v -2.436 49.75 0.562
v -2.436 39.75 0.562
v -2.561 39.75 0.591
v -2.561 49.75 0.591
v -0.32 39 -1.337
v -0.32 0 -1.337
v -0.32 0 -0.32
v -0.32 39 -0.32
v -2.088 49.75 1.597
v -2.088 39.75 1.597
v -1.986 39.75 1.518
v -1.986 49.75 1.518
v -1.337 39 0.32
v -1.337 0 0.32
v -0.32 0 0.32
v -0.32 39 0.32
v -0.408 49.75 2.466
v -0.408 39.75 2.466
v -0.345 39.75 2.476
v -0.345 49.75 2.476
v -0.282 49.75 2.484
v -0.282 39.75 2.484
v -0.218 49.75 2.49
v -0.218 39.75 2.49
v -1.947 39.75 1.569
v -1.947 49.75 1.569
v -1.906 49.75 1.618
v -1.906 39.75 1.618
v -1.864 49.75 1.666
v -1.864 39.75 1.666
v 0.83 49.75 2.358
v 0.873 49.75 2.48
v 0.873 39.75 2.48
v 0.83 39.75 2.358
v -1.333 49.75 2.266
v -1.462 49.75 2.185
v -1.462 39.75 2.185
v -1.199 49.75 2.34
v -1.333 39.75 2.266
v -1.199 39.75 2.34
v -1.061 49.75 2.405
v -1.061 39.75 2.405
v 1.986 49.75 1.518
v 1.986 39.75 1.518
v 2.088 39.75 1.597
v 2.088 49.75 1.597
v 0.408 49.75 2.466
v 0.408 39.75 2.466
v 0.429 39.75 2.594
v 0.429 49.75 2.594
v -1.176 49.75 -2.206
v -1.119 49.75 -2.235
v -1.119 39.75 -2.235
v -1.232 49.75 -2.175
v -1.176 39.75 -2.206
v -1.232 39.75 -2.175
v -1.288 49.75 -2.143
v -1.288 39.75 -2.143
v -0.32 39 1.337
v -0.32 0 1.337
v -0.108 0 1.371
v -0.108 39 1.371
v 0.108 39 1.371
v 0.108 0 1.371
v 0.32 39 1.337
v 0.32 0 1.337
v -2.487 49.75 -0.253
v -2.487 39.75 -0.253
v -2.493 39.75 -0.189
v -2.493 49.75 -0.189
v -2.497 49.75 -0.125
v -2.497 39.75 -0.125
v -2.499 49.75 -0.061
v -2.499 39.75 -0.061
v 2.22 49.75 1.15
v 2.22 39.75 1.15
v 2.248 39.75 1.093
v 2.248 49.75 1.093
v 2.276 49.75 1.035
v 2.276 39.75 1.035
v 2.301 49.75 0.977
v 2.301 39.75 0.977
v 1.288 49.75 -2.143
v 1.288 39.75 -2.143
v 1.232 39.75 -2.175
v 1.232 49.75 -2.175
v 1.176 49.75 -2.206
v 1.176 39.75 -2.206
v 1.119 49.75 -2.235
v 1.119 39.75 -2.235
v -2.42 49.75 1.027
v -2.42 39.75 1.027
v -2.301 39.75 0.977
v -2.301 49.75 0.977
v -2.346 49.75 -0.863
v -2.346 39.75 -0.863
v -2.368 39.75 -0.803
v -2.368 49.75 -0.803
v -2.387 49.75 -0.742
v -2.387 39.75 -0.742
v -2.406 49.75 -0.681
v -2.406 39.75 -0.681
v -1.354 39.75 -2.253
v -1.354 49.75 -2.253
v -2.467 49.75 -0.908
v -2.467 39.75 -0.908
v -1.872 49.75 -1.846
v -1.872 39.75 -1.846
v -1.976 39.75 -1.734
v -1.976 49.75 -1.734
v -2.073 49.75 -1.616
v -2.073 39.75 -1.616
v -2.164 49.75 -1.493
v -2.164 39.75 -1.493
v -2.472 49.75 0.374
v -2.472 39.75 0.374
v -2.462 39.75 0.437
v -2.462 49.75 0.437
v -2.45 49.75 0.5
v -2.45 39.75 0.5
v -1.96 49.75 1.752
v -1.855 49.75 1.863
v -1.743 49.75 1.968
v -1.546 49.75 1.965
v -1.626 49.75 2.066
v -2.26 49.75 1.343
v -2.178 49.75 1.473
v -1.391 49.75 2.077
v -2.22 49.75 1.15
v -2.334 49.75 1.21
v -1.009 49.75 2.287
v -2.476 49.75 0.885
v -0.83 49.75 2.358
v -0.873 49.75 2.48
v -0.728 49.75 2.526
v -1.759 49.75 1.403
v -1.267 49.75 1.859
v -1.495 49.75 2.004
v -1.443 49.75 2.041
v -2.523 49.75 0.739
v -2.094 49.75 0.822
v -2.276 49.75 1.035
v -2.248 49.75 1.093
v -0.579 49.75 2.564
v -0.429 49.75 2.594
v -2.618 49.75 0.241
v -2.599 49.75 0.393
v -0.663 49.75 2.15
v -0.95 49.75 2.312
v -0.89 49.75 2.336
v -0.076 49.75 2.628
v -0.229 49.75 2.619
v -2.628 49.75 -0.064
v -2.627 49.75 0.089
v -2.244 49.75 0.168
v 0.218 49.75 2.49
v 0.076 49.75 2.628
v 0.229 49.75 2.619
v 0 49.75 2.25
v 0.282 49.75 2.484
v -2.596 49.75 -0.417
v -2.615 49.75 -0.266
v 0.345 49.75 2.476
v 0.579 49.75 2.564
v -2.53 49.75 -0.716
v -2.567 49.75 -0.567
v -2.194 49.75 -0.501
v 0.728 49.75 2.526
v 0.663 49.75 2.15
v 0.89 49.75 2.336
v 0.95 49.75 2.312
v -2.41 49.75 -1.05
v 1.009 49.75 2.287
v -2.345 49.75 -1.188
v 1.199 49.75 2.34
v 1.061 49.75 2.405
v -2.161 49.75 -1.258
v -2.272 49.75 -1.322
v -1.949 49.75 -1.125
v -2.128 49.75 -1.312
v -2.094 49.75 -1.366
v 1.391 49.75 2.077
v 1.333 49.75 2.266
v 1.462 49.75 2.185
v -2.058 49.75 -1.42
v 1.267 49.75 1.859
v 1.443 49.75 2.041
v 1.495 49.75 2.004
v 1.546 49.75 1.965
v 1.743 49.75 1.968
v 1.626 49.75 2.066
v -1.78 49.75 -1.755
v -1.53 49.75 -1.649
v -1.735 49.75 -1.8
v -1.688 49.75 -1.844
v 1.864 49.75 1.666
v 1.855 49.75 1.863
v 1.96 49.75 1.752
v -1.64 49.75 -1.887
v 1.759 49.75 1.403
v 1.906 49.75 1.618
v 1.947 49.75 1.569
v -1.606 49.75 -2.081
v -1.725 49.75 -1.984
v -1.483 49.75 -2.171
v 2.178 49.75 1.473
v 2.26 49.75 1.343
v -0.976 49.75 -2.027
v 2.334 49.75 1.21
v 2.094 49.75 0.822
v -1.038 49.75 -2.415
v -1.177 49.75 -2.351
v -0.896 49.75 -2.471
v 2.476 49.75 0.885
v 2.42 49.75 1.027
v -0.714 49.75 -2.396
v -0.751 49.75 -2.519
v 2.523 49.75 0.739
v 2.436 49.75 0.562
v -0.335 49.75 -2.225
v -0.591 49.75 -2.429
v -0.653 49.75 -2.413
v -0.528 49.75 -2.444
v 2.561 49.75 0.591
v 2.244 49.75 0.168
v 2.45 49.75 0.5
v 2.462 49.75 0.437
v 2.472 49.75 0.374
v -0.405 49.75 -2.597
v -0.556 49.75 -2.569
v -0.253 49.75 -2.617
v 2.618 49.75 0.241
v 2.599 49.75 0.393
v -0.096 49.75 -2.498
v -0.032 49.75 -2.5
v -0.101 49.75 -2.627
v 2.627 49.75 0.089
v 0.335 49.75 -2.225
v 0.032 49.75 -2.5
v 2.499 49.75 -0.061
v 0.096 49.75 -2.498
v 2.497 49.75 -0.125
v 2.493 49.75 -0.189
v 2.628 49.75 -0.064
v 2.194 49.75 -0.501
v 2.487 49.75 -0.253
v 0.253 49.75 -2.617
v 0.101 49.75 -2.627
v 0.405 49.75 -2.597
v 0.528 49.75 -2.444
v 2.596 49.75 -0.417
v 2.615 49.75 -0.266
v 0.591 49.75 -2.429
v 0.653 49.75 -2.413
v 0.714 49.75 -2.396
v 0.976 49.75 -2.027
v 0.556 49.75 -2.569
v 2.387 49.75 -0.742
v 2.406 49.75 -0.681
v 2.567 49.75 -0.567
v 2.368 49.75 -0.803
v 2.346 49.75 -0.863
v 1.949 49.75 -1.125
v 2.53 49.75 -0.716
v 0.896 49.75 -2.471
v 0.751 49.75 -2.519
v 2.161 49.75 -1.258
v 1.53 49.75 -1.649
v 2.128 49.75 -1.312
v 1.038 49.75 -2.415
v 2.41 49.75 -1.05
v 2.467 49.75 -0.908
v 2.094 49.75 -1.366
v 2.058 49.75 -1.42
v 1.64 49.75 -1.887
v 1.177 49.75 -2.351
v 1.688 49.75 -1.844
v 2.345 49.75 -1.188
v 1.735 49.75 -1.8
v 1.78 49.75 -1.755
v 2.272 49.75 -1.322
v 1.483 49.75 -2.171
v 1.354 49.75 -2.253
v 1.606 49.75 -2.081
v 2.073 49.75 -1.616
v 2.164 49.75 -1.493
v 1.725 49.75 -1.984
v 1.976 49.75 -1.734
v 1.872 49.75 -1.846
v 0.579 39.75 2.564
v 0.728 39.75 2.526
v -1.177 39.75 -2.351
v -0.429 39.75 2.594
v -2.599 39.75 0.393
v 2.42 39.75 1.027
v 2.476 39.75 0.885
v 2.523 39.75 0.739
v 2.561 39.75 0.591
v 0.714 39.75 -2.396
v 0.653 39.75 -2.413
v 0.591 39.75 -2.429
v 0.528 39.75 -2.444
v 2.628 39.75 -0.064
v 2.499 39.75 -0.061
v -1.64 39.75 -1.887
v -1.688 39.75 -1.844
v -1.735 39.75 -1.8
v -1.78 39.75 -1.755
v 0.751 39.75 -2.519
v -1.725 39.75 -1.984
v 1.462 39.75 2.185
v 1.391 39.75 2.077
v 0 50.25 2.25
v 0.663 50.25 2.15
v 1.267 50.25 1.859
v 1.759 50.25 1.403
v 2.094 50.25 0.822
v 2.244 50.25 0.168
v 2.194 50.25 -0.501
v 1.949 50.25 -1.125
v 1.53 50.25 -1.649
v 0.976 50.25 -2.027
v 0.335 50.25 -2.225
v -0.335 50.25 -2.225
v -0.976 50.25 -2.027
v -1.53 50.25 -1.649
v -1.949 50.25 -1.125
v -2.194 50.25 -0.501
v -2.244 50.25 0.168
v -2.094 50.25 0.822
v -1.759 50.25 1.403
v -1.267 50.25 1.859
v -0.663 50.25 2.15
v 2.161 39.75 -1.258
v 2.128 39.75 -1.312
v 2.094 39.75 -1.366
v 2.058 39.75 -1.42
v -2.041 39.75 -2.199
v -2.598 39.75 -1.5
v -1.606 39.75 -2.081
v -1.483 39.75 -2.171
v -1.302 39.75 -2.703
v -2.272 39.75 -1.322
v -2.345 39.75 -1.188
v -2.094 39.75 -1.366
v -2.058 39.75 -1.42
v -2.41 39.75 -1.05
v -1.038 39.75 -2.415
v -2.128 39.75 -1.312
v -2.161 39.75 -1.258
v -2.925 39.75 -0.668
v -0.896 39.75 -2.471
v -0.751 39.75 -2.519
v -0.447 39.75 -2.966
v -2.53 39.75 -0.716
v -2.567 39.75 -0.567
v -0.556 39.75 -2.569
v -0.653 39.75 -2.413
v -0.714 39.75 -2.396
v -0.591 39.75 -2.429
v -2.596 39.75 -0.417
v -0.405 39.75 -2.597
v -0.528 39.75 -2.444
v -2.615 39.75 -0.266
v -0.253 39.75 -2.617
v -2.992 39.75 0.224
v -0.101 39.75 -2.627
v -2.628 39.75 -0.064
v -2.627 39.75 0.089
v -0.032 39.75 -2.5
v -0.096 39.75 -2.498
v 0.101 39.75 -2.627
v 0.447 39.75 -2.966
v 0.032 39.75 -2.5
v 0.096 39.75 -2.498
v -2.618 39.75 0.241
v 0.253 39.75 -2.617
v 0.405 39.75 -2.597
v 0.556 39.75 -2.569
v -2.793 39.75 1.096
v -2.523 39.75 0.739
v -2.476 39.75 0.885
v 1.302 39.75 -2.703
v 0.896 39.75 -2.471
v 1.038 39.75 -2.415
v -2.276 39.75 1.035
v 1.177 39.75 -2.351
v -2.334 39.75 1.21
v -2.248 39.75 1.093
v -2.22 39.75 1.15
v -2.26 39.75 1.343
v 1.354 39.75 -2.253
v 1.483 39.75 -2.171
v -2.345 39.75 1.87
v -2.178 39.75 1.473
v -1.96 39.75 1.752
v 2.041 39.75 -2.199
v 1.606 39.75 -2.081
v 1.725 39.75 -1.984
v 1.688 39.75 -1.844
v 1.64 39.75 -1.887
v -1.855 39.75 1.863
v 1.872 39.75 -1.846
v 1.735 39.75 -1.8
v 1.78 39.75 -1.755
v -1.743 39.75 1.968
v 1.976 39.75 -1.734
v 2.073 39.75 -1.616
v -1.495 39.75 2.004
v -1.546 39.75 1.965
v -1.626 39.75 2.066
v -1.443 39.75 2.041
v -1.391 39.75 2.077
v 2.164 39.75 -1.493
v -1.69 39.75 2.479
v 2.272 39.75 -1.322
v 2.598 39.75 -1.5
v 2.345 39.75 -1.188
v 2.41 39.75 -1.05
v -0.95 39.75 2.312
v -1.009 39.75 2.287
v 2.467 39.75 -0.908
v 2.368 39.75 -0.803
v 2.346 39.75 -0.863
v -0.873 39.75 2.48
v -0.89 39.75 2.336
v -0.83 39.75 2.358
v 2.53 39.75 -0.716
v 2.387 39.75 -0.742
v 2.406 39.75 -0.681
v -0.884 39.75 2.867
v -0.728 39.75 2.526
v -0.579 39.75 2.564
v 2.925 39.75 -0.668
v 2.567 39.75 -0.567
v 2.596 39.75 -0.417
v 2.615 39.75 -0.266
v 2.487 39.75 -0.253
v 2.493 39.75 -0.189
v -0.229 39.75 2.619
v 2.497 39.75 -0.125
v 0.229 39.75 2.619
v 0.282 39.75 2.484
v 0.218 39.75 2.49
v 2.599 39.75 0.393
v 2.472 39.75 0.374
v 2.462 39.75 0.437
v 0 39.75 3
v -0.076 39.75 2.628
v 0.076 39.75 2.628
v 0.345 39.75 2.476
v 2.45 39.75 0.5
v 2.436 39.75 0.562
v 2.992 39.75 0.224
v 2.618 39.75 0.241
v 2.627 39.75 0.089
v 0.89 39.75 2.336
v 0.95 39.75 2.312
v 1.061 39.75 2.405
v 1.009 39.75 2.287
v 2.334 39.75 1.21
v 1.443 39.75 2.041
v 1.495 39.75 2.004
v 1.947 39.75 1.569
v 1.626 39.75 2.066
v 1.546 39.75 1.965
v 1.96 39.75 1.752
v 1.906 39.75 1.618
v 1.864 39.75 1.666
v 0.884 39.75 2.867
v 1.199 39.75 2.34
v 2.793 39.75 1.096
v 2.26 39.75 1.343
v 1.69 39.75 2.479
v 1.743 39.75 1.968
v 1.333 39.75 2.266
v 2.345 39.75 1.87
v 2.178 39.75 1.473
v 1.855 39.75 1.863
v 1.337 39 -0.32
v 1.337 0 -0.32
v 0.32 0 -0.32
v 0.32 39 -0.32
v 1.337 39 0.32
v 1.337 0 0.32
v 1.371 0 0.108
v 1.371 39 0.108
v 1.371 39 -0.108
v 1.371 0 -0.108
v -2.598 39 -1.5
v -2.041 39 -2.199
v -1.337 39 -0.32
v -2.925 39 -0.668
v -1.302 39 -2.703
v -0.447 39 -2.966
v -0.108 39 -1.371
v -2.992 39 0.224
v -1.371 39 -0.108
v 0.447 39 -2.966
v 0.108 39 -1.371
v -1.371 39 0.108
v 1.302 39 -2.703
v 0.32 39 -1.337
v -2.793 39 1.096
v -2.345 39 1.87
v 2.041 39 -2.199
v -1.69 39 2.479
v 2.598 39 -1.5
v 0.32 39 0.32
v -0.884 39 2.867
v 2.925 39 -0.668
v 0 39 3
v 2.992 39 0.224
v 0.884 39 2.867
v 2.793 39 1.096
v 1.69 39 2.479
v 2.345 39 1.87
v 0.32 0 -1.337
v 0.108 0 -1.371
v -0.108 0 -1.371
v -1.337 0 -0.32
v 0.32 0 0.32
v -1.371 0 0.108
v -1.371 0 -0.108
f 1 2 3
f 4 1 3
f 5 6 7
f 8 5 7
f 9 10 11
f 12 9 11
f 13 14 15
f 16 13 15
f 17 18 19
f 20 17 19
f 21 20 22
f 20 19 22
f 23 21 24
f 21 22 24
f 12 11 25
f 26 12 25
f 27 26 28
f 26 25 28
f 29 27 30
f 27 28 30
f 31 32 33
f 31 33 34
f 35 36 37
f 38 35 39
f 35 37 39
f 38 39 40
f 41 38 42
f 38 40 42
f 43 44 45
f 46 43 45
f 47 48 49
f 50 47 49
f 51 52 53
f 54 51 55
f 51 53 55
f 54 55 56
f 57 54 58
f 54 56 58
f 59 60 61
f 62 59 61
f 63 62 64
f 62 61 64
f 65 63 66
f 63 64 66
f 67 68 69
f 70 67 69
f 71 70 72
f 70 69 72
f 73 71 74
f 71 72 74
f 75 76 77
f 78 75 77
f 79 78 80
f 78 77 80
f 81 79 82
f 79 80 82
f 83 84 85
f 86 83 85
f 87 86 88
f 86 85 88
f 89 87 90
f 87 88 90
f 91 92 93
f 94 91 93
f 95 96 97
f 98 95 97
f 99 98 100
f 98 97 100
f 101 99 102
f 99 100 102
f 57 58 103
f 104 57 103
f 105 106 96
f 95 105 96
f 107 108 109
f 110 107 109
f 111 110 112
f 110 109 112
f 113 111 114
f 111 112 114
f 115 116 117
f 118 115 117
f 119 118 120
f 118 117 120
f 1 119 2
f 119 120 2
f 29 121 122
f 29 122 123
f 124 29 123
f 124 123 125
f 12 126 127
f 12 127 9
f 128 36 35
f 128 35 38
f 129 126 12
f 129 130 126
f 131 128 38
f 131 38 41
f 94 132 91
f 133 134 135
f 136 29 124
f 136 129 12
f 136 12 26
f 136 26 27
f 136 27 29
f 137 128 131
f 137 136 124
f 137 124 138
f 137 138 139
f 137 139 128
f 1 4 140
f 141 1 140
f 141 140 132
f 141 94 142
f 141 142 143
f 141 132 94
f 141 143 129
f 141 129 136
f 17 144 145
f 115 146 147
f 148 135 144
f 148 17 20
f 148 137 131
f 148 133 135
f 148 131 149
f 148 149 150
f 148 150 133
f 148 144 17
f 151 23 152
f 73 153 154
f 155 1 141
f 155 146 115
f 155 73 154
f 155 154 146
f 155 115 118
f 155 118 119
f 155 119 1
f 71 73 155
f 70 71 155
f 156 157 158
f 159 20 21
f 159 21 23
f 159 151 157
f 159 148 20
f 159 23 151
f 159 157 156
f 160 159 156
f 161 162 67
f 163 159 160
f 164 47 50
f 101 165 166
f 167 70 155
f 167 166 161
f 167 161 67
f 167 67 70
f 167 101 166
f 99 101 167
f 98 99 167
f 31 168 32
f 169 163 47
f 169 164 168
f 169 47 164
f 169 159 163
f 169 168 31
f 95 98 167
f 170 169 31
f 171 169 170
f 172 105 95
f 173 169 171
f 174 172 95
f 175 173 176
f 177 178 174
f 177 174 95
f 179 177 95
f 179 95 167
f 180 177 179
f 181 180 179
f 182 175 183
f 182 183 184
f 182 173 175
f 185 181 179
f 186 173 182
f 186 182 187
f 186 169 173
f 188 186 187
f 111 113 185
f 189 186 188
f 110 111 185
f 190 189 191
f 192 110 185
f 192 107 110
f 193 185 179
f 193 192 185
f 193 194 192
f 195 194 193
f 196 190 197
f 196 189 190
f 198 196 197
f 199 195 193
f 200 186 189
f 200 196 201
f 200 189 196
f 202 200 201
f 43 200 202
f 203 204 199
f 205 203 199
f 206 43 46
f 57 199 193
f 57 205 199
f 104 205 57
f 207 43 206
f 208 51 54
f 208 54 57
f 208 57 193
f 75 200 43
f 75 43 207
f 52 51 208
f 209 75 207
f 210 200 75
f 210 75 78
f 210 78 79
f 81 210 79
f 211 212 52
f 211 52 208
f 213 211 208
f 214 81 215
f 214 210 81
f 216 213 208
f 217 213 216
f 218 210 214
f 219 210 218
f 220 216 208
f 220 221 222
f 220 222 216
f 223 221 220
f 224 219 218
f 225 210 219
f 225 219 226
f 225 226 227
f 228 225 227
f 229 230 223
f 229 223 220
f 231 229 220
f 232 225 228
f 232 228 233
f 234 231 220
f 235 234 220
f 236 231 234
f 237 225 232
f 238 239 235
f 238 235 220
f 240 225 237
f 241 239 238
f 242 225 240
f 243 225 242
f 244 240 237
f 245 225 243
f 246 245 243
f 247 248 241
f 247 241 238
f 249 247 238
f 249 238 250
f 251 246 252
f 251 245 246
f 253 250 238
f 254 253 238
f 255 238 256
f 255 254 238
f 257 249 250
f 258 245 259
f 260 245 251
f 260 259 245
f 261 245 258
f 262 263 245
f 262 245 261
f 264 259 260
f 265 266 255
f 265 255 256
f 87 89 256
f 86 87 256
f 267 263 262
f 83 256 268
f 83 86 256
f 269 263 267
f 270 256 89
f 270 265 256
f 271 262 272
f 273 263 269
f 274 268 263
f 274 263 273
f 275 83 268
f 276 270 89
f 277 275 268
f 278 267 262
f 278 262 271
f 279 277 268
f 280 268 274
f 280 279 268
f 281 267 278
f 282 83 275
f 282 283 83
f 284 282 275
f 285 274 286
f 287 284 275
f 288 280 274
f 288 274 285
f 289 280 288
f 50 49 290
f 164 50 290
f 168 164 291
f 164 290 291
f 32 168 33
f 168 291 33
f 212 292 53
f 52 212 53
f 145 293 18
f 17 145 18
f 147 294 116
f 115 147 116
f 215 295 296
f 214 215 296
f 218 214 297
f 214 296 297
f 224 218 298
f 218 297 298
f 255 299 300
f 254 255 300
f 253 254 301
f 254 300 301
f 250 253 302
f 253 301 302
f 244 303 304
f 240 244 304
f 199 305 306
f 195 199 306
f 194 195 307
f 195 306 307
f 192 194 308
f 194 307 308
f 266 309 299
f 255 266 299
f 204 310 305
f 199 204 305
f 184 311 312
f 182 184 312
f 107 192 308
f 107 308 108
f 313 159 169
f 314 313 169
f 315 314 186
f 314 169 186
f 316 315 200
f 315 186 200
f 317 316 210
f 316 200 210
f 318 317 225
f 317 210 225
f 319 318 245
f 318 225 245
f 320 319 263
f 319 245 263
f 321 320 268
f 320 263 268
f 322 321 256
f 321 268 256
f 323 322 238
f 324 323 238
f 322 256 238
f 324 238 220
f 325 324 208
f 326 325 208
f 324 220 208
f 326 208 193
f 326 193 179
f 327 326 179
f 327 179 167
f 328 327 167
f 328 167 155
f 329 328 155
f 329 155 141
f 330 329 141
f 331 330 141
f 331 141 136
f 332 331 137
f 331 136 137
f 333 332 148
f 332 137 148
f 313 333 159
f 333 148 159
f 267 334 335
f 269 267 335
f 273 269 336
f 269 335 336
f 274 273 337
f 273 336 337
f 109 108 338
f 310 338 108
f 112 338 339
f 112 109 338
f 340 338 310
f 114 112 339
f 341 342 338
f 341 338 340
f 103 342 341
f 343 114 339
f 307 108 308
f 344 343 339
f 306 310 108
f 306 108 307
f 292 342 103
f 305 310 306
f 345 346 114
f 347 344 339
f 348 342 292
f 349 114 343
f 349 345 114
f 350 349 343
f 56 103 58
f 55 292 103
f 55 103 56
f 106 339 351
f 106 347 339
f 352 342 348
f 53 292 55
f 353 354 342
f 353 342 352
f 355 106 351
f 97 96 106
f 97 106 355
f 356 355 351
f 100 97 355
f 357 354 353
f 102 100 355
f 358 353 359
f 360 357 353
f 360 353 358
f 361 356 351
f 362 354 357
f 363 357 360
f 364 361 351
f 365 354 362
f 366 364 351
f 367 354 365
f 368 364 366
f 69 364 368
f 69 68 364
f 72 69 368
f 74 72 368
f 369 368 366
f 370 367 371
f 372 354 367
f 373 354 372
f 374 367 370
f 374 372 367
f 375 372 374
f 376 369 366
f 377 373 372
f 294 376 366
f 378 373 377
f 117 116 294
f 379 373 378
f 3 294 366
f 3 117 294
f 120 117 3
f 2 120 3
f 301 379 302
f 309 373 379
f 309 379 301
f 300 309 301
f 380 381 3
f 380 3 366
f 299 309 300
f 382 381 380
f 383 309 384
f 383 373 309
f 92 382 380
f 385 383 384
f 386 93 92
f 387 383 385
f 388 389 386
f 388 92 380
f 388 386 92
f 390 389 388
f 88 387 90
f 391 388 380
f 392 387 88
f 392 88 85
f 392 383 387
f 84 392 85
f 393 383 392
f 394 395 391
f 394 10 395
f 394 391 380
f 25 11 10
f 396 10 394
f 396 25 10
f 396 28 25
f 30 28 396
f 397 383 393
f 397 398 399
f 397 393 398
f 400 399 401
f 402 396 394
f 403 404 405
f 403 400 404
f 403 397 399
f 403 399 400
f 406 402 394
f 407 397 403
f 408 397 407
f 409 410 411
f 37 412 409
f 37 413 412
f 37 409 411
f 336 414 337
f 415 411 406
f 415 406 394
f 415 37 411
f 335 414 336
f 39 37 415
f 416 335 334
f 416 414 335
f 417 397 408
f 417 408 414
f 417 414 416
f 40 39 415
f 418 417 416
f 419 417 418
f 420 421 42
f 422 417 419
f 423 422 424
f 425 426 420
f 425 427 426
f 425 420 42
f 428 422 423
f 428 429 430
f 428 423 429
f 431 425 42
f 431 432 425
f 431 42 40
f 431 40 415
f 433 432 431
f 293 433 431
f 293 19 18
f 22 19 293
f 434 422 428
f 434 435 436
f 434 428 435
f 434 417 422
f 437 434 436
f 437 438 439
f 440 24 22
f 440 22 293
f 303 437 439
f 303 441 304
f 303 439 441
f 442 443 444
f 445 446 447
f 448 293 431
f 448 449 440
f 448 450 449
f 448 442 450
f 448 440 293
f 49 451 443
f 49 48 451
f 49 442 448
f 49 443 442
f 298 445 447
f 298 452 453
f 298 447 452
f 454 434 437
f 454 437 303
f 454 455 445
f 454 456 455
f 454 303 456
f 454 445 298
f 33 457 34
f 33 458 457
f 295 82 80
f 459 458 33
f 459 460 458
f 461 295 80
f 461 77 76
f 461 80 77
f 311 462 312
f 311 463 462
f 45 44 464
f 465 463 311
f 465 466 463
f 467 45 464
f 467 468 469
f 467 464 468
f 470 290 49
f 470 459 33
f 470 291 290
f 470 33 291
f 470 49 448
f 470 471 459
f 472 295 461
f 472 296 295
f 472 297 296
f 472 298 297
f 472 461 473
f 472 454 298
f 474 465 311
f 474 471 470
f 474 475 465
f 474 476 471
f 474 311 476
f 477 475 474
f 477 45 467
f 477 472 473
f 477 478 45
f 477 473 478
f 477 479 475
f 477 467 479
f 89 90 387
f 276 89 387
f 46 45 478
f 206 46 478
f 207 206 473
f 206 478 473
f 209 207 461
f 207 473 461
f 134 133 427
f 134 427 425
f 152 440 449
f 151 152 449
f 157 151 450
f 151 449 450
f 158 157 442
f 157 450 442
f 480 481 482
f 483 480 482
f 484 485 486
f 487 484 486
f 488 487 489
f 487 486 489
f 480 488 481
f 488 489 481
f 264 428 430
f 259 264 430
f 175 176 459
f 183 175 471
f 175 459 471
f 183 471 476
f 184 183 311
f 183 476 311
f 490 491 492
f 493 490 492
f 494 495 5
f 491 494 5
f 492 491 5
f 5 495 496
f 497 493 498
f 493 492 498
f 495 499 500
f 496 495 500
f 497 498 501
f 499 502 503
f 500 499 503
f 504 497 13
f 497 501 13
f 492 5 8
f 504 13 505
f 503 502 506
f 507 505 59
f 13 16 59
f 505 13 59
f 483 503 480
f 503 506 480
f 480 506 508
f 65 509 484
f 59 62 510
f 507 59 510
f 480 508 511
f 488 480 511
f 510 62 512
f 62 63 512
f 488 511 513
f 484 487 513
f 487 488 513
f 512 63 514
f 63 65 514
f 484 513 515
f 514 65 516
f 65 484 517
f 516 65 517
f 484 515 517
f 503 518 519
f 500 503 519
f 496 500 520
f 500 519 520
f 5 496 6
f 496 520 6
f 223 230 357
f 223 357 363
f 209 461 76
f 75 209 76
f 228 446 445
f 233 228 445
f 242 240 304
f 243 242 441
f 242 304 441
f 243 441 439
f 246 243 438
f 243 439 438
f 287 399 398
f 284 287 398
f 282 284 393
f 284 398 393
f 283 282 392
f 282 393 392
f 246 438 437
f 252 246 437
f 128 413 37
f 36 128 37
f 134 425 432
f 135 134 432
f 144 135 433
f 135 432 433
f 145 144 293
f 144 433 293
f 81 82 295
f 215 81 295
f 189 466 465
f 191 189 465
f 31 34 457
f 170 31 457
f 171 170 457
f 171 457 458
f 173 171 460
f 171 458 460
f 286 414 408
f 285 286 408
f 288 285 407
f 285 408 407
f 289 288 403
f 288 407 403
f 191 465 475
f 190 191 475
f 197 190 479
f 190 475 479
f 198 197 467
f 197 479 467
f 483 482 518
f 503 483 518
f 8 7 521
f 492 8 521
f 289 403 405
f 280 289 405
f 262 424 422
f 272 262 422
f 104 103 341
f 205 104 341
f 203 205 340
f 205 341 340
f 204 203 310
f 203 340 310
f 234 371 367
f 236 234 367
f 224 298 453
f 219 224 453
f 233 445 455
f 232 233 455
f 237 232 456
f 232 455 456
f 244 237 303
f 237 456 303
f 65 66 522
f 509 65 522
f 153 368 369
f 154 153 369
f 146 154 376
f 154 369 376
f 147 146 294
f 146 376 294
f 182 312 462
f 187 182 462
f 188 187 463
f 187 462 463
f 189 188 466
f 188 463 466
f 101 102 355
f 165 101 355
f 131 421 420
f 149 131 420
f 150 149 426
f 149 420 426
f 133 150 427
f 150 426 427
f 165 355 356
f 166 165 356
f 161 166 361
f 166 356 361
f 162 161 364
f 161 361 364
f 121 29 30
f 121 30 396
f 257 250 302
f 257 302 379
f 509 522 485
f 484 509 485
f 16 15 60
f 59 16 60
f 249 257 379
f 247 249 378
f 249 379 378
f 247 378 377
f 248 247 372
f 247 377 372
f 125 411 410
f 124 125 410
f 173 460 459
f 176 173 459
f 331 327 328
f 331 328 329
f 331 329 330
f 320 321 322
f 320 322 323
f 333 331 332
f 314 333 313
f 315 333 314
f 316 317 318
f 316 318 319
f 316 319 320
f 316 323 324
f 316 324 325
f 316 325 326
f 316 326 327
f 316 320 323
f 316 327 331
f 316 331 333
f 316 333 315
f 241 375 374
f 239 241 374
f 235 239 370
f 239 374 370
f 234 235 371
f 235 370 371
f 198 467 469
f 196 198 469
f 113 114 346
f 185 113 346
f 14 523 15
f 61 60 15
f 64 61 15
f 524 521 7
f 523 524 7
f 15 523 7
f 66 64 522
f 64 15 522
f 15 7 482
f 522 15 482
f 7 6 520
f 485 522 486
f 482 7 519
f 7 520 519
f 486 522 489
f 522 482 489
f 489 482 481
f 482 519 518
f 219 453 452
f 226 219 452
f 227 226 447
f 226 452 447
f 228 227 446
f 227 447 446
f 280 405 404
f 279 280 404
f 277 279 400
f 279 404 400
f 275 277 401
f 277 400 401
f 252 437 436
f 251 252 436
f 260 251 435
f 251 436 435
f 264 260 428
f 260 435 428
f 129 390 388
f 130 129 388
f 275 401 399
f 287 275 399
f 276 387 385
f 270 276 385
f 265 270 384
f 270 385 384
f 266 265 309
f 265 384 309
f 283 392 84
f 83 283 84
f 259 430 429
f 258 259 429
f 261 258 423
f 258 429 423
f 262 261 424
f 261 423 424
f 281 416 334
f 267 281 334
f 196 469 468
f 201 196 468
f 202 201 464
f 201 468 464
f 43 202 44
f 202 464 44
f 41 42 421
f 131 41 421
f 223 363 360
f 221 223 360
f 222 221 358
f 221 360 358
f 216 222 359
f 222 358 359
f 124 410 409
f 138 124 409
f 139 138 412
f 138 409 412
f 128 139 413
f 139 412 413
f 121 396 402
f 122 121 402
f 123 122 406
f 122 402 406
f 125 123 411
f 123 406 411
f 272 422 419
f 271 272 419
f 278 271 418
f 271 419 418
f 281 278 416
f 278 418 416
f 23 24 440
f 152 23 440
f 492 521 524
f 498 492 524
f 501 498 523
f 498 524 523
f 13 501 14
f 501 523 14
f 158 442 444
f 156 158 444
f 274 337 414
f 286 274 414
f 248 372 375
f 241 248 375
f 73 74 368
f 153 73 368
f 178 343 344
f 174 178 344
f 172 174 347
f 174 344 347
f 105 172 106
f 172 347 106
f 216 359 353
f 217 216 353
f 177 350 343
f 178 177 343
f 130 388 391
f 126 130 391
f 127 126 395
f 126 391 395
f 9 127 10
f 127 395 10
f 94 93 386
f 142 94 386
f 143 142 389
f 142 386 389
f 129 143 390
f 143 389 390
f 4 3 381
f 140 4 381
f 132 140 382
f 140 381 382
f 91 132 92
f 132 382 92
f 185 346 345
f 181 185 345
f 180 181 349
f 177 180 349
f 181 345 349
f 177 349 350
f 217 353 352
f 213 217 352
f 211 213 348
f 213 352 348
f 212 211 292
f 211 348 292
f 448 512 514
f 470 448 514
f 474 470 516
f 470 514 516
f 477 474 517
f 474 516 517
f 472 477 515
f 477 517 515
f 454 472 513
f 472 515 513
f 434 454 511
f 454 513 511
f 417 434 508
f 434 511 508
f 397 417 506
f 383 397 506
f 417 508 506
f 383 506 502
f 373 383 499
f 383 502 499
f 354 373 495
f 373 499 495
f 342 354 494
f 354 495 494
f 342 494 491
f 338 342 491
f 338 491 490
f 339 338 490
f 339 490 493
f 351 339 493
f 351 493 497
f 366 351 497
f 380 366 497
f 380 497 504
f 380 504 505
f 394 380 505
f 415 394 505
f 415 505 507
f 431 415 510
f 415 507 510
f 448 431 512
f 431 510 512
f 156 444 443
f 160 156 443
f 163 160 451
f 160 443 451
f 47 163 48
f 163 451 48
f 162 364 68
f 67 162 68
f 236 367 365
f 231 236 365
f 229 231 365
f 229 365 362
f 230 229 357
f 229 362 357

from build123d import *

# Parameters (mm, degrees)
BOSS_EXTRUDE2_DEPTH = 39
SKETCH5_R           = 3
BOSS_EXTRUDE3_DEPTH = 0.75
BOSS_EXTRUDE5_DEPTH = 10
SKETCH10_R          = 2.25
BOSS_EXTRUDE6_DEPTH = 0.5


with BuildPart() as part:
    # Sketch4 → Boss-Extrude2 (new body)
    with BuildSketch(Plane(origin=(0, 0, 0), x_dir=(1, 0, 0), z_dir=(0, 1, 0))):
        with BuildLine():
            Line((-0.32, 1.337245303), (-0.32, 0.32))
            Line((-0.32, 0.32), (-1.337245303, 0.32))
            ThreePointArc((-1.337245303, 0.32), (-1.375, 0), (-1.337245303, -0.32))
            Line((-1.337245303, -0.32), (-0.32, -0.32))
            Line((-0.32, -0.32), (-0.32, -1.337245303))
            ThreePointArc((-0.32, -1.337245303), (0, -1.375), (0.32, -1.337245303))
            Line((0.32, -1.337245303), (0.32, -0.32))
            Line((0.32, -0.32), (1.337245303, -0.32))
            ThreePointArc((1.337245303, -0.32), (1.375, 0), (1.337245303, 0.32))
            Line((1.337245303, 0.32), (0.32, 0.32))
            Line((0.32, 0.32), (0.32, 1.337245303))
            ThreePointArc((0.32, 1.337245303), (0, 1.375), (-0.32, 1.337245303))
        make_face()
    extrude(amount=BOSS_EXTRUDE2_DEPTH)

    # Sketch5 → Boss-Extrude3 (add)
    with BuildSketch(Plane(origin=(0, 39, 0), x_dir=(1, 0, 0), z_dir=(0, 1, 0))):
        with Locations(Location((0, 0, 0), (0, 0, 270))):
            Circle(SKETCH5_R)
    extrude(amount=BOSS_EXTRUDE3_DEPTH)

    # Sketch9 → Boss-Extrude5 (add)
    with BuildSketch(Plane(origin=(0, 39.75, 0), x_dir=(1, 0, 0), z_dir=(0, 1, 0))):
        with BuildLine():
            Line((-0.83040283, -2.358056645), (-0.873204905, -2.479599724))
            ThreePointArc((-0.873204905, -2.479599724), (-0.653770741, -2.546268921), (-0.429360987, -2.593559473))
            Line((-0.429360987, -2.593559473), (-0.408314906, -2.466430404))
            ThreePointArc((-0.408314906, -2.466430404), (-0.313333084, -2.480286753), (-0.217889357, -2.490486745))
            Line((-0.217889357, -2.490486745), (-0.229120191, -2.618855769))
            ThreePointArc((-0.229120191, -2.618855769), (0, -2.628859372), (0.229120191, -2.618855769))
            Line((0.229120191, -2.618855769), (0.217889357, -2.490486745))
            ThreePointArc((0.217889357, -2.490486745), (0.313333084, -2.480286753), (0.408314906, -2.466430404))
            Line((0.408314906, -2.466430404), (0.429360987, -2.593559473))
            ThreePointArc((0.429360987, -2.593559473), (0.653770741, -2.546268921), (0.873204905, -2.479599724))
            Line((0.873204905, -2.479599724), (0.83040283, -2.358056645))
            ThreePointArc((0.83040283, -2.358056645), (0.920311382, -2.324441215), (1.008863241, -2.28739917))
            Line((1.008863241, -2.28739917), (1.060863834, -2.405300298))
            ThreePointArc((1.060863834, -2.405300298), (1.266462661, -2.303687029), (1.462422943, -2.18454131))
            Line((1.462422943, -2.18454131), (1.390739039, -2.077461173))
            ThreePointArc((1.390739039, -2.077461173), (1.469463131, -2.022542486), (1.546020988, -1.964642233))
            Line((1.546020988, -1.964642233), (1.625708706, -2.065907259))
            ThreePointArc((1.625708706, -2.065907259), (1.799578075, -1.916356008), (1.959751569, -1.752220131))
            Line((1.959751569, -1.752220131), (1.863689999, -1.666331176))
            ThreePointArc((1.863689999, -1.666331176), (1.926283107, -1.593559974), (1.986036551, -1.518439599))
            Line((1.986036551, -1.518439599), (2.088404321, -1.596705669))
            ThreePointArc((2.088404321, -1.596705669), (2.21961938, -1.408613292), (2.333941796, -1.209800517))
            Line((2.333941796, -1.209800517), (2.219538463, -1.150499462))
            ThreePointArc((2.219538463, -1.150499462), (2.262067631, -1.064448229), (2.301262134, -0.976827821))
            Line((2.301262134, -0.976827821), (2.419877811, -1.027177189))
            ThreePointArc((2.419877811, -1.027177189), (2.500193836, -0.812362222), (2.561481877, -0.591364688))
            Line((2.561481877, -0.591364688), (2.435925162, -0.562377636))
            ThreePointArc((2.435925162, -0.562377636), (2.455718127, -0.468453286), (2.471890953, -0.373838359))
            Line((2.471890953, -0.373838359), (2.599301479, -0.393107389))
            ThreePointArc((2.599301479, -0.393107389), (2.623671919, -0.165067446), (2.628074631, 0.064228761))
            Line((2.628074631, 0.064228761), (2.499253724, 0.061080445))
            ThreePointArc((2.499253724, 0.061080445), (2.495066821, 0.156976299), (2.487201772, 0.252640743))
            Line((2.487201772, 0.252640743), (2.615401476, 0.265662794))
            ThreePointArc((2.615401476, 0.265662794), (2.582295045, 0.492599125), (2.52953579, 0.715786479))
            Line((2.52953579, 0.715786479), (2.405544984, 0.680700618))
            ThreePointArc((2.405544984, 0.680700618), (2.377641291, 0.772542486), (2.346232557, 0.863245497))
            Line((2.346232557, 0.863245497), (2.467166179, 0.907740407))
            ThreePointArc((2.467166179, 0.907740407), (2.378663077, 1.119313881), (2.272056913, 1.322368701))
            Line((2.272056913, 1.322368701), (2.160687005, 1.257549867))
            ThreePointArc((2.160687005, 1.257549867), (2.110819814, 1.339566987), (2.057840921, 1.419609363))
            Line((2.057840921, 1.419609363), (2.163909757, 1.492781351))
            ThreePointArc((2.163909757, 1.492781351), (2.02557096, 1.67569803), (1.871816344, 1.845861634))
            Line((1.871816344, 1.845861634), (1.780065115, 1.755382632))
            ThreePointArc((1.780065115, 1.755382632), (1.711367765, 1.822421569), (1.640147572, 1.886773951))
            Line((1.640147572, 1.886773951), (1.724686927, 1.984025353))
            ThreePointArc((1.724686927, 1.984025353), (1.545204769, 2.126791908), (1.35396267, 2.253372292))
            Line((1.35396267, 2.253372292), (1.287595187, 2.142918252))
            ThreePointArc((1.287595187, 2.142918252), (1.204384185, 2.1907667), (1.11939772, 2.235385592))
            Line((1.11939772, 2.235385592), (1.177095675, 2.350605746))
            ThreePointArc((1.177095675, 2.350605746), (0.96774768, 2.444251629), (0.751034542, 2.519295281))
            Line((0.751034542, 2.519295281), (0.714220919, 2.395806436))
            ThreePointArc((0.714220919, 2.395806436), (0.621724718, 2.421457903), (0.528311991, 2.443539736))
            Line((0.528311991, 2.443539736), (0.555543172, 2.569488934))
            ThreePointArc((0.555543172, 2.569488934), (0.329483446, 2.608130031), (0.100916152, 2.626921683))
            Line((0.100916152, 2.626921683), (0.095969523, 2.498157291))
            ThreePointArc((0.095969523, 2.498157291), (0, 2.5), (-0.095969523, 2.498157291))
            Line((-0.095969523, 2.498157291), (-0.100916152, 2.626921683))
            ThreePointArc((-0.100916152, 2.626921683), (-0.329483446, 2.608130031), (-0.555543172, 2.569488934))
            Line((-0.555543172, 2.569488934), (-0.528311991, 2.443539736))
            ThreePointArc((-0.528311991, 2.443539736), (-0.621724718, 2.421457903), (-0.714220919, 2.395806436))
            Line((-0.714220919, 2.395806436), (-0.751034542, 2.519295281))
            ThreePointArc((-0.751034542, 2.519295281), (-0.96774768, 2.444251629), (-1.177095675, 2.350605746))
            Line((-1.177095675, 2.350605746), (-1.11939772, 2.235385592))
            ThreePointArc((-1.11939772, 2.235385592), (-1.204384185, 2.1907667), (-1.287595187, 2.142918252))
            Line((-1.287595187, 2.142918252), (-1.35396267, 2.253372292))
            ThreePointArc((-1.35396267, 2.253372292), (-1.545204769, 2.126791908), (-1.724686927, 1.984025353))
            Line((-1.724686927, 1.984025353), (-1.640147572, 1.886773951))
            ThreePointArc((-1.640147572, 1.886773951), (-1.711367765, 1.822421569), (-1.780065115, 1.755382632))
            Line((-1.780065115, 1.755382632), (-1.871816344, 1.845861634))
            ThreePointArc((-1.871816344, 1.845861634), (-2.02557096, 1.67569803), (-2.163909757, 1.492781351))
            Line((-2.163909757, 1.492781351), (-2.057840921, 1.419609363))
            ThreePointArc((-2.057840921, 1.419609363), (-2.110819814, 1.339566987), (-2.160687005, 1.257549867))
            Line((-2.160687005, 1.257549867), (-2.272056913, 1.322368701))
            ThreePointArc((-2.272056913, 1.322368701), (-2.378663077, 1.119313881), (-2.467166179, 0.907740407))
            Line((-2.467166179, 0.907740407), (-2.346232557, 0.863245497))
            ThreePointArc((-2.346232557, 0.863245497), (-2.377641291, 0.772542486), (-2.405544984, 0.680700618))
            Line((-2.405544984, 0.680700618), (-2.52953579, 0.715786479))
            ThreePointArc((-2.52953579, 0.715786479), (-2.582295045, 0.492599125), (-2.615401476, 0.265662794))
            Line((-2.615401476, 0.265662794), (-2.487201772, 0.252640743))
            ThreePointArc((-2.487201772, 0.252640743), (-2.495066821, 0.156976299), (-2.499253724, 0.061080445))
            Line((-2.499253724, 0.061080445), (-2.628074631, 0.064228761))
            ThreePointArc((-2.628074631, 0.064228761), (-2.623671919, -0.165067446), (-2.599301479, -0.393107389))
            Line((-2.599301479, -0.393107389), (-2.471890953, -0.373838359))
            ThreePointArc((-2.471890953, -0.373838359), (-2.455718127, -0.468453286), (-2.435925162, -0.562377636))
            Line((-2.435925162, -0.562377636), (-2.561481877, -0.591364688))
            ThreePointArc((-2.561481877, -0.591364688), (-2.500193836, -0.812362222), (-2.419877811, -1.027177189))
            Line((-2.419877811, -1.027177189), (-2.301262134, -0.976827821))
            ThreePointArc((-2.301262134, -0.976827821), (-2.262067631, -1.064448229), (-2.219538463, -1.150499462))
            Line((-2.219538463, -1.150499462), (-2.333941796, -1.209800517))
            ThreePointArc((-2.333941796, -1.209800517), (-2.21961938, -1.408613292), (-2.088404321, -1.596705669))
            Line((-2.088404321, -1.596705669), (-1.986036551, -1.518439599))
            ThreePointArc((-1.986036551, -1.518439599), (-1.926283107, -1.593559974), (-1.863689999, -1.666331176))
            Line((-1.863689999, -1.666331176), (-1.959751569, -1.752220131))
            ThreePointArc((-1.959751569, -1.752220131), (-1.799578075, -1.916356008), (-1.625708706, -2.065907259))
            Line((-1.625708706, -2.065907259), (-1.546020988, -1.964642233))
            ThreePointArc((-1.546020988, -1.964642233), (-1.469463131, -2.022542486), (-1.390739039, -2.077461173))
            Line((-1.390739039, -2.077461173), (-1.462422943, -2.18454131))
            ThreePointArc((-1.462422943, -2.18454131), (-1.266462661, -2.303687029), (-1.060863834, -2.405300298))
            Line((-1.060863834, -2.405300298), (-1.008863241, -2.28739917))
            ThreePointArc((-1.008863241, -2.28739917), (-0.920311382, -2.324441215), (-0.83040283, -2.358056645))
        make_face()
    extrude(amount=BOSS_EXTRUDE5_DEPTH)

    # Sketch10 → Boss-Extrude6 (add)
    with BuildSketch(Plane(origin=(0, 49.75, 0), x_dir=(1, 0, 0), z_dir=(0, 1, 0))):
        with Locations(Location((0, 0, 0), (0, 0, 270))):
            Circle(SKETCH10_R)
    extrude(amount=BOSS_EXTRUDE6_DEPTH)


solid = part.part
